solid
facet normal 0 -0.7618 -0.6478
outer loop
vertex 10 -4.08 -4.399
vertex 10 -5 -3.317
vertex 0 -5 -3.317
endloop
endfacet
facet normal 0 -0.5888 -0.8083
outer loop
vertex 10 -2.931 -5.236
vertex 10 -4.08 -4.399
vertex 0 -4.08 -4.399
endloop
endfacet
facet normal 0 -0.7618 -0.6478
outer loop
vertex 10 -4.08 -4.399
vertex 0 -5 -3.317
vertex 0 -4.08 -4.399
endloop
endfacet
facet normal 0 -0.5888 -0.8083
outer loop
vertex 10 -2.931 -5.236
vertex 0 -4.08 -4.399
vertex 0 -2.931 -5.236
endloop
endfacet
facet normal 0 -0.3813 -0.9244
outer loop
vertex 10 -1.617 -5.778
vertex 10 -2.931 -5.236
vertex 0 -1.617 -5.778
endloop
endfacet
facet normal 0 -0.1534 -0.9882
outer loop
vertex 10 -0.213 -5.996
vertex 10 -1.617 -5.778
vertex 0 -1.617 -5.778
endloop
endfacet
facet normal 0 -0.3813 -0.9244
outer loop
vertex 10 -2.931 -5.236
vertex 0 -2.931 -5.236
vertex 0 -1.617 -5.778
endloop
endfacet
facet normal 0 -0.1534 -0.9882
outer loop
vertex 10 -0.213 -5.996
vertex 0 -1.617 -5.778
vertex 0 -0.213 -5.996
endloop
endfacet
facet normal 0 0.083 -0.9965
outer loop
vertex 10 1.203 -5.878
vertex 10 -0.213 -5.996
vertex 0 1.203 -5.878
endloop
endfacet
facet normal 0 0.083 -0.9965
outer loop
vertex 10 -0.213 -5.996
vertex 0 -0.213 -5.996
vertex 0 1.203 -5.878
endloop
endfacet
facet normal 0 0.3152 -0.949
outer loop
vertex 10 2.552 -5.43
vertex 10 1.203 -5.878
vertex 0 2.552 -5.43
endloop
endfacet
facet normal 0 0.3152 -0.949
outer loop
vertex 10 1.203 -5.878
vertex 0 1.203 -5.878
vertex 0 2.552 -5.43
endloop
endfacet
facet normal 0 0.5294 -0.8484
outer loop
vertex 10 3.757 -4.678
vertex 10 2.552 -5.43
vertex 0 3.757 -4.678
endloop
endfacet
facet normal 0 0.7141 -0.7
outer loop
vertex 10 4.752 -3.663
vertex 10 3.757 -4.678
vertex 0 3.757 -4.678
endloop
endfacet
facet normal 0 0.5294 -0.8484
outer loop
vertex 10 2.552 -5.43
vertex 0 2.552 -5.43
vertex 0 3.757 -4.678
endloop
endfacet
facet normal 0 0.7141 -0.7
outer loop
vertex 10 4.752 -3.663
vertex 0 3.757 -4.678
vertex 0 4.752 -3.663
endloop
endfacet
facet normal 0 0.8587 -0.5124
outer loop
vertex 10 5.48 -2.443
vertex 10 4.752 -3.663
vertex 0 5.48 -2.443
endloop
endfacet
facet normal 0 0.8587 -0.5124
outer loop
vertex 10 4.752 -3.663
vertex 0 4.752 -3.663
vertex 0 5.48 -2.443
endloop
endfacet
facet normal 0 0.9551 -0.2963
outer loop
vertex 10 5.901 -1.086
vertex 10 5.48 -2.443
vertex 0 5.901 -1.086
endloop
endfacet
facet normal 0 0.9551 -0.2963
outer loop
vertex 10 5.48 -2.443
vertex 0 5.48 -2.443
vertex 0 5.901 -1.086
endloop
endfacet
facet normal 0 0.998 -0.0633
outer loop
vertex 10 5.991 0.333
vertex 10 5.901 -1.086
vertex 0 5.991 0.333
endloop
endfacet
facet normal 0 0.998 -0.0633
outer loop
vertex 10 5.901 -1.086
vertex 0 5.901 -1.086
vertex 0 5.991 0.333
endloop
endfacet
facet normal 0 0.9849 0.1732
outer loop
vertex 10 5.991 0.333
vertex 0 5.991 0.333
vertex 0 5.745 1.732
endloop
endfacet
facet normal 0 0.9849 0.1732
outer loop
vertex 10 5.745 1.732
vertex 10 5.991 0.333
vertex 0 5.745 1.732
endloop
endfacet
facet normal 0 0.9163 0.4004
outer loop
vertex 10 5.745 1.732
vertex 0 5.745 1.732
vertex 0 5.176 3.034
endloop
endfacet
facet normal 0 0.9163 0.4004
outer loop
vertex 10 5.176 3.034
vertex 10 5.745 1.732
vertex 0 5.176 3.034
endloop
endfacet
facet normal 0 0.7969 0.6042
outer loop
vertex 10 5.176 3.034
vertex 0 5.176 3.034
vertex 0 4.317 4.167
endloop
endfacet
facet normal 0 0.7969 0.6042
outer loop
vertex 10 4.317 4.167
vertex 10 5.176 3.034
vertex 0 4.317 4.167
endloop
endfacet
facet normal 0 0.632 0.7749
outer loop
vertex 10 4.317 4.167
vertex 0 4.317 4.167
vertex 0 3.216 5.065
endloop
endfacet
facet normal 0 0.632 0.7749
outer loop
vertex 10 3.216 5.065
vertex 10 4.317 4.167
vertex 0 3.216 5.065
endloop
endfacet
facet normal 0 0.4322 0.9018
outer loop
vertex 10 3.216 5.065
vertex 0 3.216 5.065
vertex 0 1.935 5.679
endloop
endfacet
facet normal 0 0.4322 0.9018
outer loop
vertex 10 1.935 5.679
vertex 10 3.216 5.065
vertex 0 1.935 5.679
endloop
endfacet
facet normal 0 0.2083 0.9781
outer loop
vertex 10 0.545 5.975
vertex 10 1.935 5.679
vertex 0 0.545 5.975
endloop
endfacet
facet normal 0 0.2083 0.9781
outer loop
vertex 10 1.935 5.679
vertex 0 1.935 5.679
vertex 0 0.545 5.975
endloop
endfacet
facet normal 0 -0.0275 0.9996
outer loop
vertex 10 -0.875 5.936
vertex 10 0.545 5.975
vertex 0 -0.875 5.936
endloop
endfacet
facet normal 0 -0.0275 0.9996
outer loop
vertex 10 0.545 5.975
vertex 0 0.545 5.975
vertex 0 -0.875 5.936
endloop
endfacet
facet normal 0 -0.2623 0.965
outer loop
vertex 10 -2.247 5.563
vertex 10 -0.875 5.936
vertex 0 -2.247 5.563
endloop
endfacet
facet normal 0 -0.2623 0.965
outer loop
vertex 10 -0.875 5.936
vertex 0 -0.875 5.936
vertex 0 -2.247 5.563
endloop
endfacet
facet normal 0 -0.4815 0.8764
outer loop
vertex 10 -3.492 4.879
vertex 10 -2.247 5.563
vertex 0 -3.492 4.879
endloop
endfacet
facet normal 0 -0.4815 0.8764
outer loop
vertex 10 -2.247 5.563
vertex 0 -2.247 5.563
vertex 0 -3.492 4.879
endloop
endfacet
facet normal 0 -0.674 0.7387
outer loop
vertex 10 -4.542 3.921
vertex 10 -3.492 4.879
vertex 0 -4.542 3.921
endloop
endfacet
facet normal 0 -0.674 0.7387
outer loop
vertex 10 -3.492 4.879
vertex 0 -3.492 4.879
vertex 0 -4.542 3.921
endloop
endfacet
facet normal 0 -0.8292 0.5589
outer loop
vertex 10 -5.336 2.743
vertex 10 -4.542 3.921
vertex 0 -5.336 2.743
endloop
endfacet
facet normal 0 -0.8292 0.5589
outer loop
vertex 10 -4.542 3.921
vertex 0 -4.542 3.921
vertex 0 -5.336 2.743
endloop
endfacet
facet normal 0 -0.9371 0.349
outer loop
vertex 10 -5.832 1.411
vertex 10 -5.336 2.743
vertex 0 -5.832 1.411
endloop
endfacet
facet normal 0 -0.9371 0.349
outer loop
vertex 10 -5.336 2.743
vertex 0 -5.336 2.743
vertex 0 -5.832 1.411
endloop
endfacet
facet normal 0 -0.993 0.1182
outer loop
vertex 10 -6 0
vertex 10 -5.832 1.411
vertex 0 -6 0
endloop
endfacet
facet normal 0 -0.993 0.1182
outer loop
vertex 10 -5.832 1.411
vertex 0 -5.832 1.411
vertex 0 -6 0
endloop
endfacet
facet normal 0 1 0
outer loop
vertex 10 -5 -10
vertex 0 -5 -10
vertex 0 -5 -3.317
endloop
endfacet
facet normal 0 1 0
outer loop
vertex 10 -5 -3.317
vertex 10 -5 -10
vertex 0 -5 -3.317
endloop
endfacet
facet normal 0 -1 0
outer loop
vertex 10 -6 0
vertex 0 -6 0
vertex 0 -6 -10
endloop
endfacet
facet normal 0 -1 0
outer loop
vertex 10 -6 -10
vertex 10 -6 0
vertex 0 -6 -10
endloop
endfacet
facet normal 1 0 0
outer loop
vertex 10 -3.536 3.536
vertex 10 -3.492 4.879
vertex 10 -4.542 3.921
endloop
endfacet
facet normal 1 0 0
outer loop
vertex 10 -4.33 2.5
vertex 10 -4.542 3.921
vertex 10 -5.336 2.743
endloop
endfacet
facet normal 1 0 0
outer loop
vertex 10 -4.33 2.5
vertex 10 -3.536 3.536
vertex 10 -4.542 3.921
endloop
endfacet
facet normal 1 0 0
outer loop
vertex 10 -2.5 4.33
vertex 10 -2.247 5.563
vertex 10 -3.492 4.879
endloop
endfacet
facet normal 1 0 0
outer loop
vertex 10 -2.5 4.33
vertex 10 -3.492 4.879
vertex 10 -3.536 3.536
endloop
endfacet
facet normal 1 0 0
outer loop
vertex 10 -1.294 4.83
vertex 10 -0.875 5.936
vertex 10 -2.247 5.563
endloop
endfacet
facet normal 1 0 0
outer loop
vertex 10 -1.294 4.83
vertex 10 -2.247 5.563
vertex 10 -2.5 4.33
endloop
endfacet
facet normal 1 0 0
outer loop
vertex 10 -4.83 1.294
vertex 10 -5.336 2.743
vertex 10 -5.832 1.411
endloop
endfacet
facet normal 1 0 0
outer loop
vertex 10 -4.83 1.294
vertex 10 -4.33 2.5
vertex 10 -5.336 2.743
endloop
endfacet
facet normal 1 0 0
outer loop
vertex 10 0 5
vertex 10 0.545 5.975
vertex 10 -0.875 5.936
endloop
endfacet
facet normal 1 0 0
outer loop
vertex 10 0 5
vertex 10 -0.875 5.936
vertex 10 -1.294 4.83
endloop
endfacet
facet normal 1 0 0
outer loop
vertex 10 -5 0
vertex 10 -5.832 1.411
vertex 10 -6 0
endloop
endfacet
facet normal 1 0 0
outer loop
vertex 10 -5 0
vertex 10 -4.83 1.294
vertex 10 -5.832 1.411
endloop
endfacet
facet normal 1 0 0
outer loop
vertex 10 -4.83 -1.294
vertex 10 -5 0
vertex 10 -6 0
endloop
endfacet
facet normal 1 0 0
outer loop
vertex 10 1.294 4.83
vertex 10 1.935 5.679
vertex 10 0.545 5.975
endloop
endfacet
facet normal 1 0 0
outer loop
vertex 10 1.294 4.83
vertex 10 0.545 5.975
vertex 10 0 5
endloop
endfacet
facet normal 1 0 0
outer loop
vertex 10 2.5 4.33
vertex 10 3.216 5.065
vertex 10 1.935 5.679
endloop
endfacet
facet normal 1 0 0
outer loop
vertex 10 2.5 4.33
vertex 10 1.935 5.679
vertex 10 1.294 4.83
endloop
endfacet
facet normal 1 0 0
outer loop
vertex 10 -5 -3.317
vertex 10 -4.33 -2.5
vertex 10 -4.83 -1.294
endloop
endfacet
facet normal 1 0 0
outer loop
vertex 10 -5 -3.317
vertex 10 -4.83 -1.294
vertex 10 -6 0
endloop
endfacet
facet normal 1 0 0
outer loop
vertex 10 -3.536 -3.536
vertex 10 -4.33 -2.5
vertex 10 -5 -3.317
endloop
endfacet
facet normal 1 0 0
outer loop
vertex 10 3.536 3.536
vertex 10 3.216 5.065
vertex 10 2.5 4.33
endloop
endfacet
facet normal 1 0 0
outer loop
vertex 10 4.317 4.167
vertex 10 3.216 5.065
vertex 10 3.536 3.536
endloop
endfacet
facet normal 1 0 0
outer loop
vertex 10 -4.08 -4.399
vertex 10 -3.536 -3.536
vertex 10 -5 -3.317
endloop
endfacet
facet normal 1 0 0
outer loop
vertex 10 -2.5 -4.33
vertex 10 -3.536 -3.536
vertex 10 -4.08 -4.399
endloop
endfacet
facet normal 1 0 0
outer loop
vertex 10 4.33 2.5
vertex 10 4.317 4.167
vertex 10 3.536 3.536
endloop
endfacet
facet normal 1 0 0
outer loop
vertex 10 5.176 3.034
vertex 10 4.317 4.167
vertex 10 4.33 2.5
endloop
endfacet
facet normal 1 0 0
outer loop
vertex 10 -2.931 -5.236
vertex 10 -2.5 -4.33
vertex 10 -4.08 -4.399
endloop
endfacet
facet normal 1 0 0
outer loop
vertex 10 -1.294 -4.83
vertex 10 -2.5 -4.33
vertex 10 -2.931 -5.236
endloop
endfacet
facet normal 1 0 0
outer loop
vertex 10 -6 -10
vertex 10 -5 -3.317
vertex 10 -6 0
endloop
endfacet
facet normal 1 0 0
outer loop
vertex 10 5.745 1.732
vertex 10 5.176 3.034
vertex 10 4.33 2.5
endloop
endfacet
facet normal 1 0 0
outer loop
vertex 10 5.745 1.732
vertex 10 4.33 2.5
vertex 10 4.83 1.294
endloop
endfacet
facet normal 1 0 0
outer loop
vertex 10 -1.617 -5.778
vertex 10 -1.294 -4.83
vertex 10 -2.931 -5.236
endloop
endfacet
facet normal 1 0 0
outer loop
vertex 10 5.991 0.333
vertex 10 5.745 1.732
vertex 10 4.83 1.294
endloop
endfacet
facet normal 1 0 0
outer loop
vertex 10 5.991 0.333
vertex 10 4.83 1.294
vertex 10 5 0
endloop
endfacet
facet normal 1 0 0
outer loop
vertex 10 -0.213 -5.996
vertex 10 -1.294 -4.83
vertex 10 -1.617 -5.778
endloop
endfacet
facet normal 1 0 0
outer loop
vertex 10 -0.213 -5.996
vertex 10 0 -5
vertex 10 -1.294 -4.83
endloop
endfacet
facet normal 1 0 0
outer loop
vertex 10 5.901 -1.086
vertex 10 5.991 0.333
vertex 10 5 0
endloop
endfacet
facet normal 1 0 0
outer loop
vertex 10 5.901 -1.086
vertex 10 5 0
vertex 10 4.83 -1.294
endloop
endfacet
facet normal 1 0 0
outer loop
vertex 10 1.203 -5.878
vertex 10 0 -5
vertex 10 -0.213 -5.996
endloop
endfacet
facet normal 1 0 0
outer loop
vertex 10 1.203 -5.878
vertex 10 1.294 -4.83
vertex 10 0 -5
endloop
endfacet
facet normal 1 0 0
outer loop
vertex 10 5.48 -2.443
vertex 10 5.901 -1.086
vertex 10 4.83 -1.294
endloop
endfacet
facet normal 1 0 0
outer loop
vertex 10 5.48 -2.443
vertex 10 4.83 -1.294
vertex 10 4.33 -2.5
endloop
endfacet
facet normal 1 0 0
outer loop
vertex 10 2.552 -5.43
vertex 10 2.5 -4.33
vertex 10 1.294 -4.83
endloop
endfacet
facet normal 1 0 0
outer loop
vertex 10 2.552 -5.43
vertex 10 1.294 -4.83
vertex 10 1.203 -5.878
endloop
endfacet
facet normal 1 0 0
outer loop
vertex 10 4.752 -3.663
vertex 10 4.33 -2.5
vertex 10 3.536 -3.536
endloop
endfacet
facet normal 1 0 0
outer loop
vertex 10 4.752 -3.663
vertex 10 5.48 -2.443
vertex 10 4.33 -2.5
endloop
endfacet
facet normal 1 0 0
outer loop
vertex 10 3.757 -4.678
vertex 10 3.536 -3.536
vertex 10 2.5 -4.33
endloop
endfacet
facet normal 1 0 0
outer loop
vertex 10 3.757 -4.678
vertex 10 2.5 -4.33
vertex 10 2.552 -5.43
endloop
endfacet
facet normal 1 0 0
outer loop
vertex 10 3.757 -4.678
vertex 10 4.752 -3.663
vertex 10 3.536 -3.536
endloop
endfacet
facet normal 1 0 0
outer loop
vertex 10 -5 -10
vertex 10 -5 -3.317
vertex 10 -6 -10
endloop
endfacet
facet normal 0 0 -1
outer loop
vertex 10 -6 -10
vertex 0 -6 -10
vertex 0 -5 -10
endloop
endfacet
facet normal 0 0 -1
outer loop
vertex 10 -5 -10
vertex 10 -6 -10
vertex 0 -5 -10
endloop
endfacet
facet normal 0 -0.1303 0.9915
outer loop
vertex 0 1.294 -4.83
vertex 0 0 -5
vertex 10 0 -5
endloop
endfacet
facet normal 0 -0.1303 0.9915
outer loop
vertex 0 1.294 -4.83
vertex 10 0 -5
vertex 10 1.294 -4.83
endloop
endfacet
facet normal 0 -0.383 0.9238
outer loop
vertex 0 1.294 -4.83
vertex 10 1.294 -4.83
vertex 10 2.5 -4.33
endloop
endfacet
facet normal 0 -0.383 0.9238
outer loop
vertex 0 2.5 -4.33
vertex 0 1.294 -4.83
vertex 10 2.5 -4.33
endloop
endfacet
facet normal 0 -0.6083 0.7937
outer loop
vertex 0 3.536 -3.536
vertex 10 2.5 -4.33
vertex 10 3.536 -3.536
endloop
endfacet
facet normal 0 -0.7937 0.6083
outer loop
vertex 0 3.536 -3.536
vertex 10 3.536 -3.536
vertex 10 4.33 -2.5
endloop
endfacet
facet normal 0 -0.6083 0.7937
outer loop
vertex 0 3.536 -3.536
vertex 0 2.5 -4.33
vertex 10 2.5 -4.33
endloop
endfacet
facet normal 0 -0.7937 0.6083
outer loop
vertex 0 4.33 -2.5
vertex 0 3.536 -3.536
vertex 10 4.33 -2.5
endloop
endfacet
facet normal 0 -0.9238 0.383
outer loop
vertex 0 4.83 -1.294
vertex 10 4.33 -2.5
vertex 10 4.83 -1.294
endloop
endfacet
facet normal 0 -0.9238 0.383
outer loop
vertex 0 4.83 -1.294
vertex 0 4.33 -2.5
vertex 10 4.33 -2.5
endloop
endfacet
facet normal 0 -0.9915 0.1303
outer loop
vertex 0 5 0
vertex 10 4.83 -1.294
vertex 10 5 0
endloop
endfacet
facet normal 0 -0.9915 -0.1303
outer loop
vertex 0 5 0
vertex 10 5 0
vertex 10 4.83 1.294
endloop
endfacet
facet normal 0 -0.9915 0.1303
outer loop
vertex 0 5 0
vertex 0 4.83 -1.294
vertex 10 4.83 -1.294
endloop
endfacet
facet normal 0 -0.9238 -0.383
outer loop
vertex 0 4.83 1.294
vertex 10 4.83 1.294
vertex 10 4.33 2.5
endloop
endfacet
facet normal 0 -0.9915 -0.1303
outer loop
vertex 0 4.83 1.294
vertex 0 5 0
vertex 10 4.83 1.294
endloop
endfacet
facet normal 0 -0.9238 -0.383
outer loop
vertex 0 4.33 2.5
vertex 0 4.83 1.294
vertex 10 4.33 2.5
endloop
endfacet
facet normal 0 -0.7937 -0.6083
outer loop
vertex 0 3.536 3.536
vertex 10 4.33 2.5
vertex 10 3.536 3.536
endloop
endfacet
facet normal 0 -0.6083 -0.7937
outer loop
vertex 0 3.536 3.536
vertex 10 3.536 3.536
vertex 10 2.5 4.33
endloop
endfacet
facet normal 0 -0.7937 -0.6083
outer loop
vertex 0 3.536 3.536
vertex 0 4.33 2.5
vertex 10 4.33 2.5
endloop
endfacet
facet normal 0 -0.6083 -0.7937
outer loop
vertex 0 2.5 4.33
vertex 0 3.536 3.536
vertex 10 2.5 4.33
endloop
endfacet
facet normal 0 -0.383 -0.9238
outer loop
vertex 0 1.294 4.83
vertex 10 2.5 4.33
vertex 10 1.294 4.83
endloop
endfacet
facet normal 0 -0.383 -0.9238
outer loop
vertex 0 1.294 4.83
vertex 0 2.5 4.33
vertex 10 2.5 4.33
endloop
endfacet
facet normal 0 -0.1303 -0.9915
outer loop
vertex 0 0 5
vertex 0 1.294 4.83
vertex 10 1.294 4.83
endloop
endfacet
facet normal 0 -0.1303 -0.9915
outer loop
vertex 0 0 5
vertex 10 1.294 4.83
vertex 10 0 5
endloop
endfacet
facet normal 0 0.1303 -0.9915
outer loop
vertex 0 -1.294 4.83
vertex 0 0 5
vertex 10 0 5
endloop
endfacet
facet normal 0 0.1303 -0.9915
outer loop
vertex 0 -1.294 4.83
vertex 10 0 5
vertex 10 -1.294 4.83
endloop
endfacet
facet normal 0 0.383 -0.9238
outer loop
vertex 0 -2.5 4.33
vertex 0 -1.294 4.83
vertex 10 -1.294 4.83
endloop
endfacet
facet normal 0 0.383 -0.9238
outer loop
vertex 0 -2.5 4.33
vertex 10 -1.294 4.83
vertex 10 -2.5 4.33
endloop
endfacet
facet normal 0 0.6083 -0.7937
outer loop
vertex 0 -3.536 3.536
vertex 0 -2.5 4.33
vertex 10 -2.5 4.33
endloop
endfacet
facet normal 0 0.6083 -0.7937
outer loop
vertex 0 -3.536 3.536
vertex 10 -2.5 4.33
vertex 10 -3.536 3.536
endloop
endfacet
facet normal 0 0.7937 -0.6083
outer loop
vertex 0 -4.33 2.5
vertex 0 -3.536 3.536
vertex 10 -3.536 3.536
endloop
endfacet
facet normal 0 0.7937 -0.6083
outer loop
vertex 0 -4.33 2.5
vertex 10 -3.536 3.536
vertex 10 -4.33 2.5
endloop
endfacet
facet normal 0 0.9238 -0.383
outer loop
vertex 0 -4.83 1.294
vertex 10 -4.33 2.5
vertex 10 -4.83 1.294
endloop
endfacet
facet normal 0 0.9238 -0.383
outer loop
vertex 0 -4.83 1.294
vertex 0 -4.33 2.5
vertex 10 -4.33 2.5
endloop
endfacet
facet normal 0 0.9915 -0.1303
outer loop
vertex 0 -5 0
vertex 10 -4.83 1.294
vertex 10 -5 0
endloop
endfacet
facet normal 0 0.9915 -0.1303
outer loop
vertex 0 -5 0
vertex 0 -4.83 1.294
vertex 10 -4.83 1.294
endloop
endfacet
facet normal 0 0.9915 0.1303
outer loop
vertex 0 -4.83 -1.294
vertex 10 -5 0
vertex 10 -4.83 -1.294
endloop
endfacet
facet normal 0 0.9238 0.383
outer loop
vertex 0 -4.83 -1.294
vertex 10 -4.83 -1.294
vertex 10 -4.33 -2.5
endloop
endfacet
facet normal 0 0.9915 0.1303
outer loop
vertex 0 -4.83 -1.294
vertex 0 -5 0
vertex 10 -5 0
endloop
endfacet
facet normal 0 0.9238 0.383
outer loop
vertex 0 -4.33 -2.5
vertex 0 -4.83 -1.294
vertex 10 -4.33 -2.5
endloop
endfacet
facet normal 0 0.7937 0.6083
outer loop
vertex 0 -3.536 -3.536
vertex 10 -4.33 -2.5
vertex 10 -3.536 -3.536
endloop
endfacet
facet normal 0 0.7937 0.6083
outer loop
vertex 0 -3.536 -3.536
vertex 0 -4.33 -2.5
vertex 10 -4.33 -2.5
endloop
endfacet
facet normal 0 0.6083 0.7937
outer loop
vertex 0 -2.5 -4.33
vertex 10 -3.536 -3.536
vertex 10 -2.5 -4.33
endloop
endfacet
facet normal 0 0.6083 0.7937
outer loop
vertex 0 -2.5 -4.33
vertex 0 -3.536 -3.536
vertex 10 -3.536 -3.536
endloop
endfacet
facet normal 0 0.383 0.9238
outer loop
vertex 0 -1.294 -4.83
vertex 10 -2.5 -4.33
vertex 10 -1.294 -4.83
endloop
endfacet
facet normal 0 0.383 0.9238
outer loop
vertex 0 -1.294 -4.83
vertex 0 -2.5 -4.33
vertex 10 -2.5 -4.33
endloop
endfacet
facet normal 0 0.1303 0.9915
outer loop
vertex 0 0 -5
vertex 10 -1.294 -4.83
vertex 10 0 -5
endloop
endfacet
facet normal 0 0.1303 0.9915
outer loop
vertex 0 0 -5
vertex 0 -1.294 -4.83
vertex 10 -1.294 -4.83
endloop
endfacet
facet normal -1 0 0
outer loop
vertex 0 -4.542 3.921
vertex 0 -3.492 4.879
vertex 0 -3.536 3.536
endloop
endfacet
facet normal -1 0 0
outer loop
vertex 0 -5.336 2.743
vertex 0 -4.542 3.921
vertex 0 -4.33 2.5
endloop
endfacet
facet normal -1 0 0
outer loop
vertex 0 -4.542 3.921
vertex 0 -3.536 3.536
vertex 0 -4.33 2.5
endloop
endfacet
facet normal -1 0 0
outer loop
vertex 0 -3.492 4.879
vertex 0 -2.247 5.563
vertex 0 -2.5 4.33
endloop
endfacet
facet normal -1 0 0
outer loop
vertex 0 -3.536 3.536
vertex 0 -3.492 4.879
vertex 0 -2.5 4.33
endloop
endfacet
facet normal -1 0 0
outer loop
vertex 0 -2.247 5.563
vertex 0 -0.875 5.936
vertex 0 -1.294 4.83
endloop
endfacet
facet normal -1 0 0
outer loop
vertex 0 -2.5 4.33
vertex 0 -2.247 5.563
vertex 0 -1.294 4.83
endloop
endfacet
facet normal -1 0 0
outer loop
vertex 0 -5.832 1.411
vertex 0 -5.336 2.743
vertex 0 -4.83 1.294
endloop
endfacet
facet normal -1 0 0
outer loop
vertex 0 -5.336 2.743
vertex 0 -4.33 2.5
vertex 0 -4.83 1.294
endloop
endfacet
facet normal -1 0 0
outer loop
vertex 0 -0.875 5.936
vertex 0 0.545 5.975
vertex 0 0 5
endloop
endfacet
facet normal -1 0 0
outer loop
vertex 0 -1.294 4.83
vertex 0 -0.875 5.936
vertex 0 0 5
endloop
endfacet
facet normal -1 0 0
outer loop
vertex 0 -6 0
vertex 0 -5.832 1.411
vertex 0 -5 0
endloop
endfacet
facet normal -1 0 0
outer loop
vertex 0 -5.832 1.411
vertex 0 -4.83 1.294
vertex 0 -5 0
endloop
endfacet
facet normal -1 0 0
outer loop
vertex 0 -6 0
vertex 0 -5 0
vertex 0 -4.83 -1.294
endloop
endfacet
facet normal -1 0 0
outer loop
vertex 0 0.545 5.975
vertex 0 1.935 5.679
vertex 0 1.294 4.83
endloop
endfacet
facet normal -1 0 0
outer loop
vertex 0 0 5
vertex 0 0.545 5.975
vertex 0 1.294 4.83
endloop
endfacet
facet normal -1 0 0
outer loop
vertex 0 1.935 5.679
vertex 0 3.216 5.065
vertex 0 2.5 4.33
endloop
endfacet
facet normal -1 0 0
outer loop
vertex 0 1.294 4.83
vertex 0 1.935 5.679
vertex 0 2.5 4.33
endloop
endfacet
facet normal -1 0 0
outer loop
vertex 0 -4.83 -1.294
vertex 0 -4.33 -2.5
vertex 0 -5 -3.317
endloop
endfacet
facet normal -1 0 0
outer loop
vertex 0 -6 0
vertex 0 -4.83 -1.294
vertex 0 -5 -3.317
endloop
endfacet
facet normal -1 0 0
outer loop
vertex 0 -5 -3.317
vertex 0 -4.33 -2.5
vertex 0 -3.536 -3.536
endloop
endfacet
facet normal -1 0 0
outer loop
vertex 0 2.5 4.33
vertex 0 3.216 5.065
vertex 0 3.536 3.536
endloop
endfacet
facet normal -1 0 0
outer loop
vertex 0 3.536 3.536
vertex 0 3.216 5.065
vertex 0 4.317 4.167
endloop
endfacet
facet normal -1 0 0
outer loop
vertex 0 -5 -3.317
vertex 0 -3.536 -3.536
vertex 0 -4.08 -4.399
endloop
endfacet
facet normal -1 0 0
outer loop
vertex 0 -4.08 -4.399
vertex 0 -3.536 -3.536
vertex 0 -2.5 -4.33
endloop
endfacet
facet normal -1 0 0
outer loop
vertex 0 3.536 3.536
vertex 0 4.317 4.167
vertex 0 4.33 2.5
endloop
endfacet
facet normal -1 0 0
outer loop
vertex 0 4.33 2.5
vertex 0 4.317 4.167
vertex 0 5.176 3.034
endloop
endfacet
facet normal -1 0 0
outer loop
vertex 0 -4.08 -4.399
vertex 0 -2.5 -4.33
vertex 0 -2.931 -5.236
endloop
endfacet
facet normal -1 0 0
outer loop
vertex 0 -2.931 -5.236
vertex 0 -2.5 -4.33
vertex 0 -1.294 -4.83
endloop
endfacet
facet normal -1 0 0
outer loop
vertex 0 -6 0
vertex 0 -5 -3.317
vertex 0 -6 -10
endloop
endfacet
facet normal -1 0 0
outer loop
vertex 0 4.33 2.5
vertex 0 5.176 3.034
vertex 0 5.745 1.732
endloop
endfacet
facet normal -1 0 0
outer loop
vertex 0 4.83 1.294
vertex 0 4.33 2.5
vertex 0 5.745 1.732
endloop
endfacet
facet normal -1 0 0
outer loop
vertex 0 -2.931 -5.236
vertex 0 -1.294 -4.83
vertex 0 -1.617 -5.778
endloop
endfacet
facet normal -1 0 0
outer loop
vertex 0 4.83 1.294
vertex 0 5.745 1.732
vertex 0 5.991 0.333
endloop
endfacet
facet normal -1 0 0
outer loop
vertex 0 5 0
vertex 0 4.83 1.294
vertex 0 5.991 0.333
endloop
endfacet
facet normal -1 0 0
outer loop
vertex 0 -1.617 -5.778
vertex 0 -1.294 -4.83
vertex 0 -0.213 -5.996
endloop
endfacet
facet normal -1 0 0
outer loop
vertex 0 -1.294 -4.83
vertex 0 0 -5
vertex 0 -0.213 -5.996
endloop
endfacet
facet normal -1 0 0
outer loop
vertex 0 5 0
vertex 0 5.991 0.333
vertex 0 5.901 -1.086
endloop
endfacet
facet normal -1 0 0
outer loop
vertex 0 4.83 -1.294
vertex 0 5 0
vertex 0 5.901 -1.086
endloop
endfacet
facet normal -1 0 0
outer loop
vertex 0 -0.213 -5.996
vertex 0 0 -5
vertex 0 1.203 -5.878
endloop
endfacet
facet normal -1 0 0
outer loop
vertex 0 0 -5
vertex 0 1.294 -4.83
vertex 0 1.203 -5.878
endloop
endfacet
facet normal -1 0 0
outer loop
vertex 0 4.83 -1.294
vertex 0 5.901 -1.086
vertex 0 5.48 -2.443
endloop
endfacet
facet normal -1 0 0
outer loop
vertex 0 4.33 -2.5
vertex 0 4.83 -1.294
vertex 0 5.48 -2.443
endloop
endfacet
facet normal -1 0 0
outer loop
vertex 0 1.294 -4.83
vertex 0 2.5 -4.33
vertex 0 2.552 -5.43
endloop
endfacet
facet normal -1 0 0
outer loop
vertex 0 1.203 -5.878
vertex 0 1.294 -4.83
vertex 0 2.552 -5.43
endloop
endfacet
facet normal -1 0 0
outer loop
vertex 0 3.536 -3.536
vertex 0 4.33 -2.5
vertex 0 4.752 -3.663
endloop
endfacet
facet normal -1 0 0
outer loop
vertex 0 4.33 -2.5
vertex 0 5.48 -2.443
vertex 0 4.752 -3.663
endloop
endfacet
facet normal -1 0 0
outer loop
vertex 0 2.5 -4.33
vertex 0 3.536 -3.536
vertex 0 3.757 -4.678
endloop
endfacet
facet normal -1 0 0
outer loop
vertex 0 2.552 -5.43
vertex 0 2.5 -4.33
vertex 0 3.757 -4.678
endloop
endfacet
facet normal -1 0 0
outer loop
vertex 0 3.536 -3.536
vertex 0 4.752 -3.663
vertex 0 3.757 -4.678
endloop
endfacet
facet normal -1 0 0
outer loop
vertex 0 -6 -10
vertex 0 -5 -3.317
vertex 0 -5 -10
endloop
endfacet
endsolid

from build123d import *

# Parameters (mm, degrees)
SKETCH1_R           = 5
BOSS_EXTRUDE1_DEPTH = 10


with BuildPart() as part:
    # Sketch1 → Boss-Extrude1 (new body)
    with BuildSketch(Plane(origin=(0, 0, 0), x_dir=(0, 0, -1), z_dir=(1, 0, 0))):
        with BuildLine():
            Line((10, -5), (3.31662479, -5))
            ThreePointArc((3.31662479, -5), (-1.732050808, 5.744562647), (0, -6))
            Line((0, -6), (10, -6))
            Line((10, -6), (10, -5))
        make_face()
        Circle(SKETCH1_R, mode=Mode.SUBTRACT)
    extrude(amount=BOSS_EXTRUDE1_DEPTH)


solid = part.part
